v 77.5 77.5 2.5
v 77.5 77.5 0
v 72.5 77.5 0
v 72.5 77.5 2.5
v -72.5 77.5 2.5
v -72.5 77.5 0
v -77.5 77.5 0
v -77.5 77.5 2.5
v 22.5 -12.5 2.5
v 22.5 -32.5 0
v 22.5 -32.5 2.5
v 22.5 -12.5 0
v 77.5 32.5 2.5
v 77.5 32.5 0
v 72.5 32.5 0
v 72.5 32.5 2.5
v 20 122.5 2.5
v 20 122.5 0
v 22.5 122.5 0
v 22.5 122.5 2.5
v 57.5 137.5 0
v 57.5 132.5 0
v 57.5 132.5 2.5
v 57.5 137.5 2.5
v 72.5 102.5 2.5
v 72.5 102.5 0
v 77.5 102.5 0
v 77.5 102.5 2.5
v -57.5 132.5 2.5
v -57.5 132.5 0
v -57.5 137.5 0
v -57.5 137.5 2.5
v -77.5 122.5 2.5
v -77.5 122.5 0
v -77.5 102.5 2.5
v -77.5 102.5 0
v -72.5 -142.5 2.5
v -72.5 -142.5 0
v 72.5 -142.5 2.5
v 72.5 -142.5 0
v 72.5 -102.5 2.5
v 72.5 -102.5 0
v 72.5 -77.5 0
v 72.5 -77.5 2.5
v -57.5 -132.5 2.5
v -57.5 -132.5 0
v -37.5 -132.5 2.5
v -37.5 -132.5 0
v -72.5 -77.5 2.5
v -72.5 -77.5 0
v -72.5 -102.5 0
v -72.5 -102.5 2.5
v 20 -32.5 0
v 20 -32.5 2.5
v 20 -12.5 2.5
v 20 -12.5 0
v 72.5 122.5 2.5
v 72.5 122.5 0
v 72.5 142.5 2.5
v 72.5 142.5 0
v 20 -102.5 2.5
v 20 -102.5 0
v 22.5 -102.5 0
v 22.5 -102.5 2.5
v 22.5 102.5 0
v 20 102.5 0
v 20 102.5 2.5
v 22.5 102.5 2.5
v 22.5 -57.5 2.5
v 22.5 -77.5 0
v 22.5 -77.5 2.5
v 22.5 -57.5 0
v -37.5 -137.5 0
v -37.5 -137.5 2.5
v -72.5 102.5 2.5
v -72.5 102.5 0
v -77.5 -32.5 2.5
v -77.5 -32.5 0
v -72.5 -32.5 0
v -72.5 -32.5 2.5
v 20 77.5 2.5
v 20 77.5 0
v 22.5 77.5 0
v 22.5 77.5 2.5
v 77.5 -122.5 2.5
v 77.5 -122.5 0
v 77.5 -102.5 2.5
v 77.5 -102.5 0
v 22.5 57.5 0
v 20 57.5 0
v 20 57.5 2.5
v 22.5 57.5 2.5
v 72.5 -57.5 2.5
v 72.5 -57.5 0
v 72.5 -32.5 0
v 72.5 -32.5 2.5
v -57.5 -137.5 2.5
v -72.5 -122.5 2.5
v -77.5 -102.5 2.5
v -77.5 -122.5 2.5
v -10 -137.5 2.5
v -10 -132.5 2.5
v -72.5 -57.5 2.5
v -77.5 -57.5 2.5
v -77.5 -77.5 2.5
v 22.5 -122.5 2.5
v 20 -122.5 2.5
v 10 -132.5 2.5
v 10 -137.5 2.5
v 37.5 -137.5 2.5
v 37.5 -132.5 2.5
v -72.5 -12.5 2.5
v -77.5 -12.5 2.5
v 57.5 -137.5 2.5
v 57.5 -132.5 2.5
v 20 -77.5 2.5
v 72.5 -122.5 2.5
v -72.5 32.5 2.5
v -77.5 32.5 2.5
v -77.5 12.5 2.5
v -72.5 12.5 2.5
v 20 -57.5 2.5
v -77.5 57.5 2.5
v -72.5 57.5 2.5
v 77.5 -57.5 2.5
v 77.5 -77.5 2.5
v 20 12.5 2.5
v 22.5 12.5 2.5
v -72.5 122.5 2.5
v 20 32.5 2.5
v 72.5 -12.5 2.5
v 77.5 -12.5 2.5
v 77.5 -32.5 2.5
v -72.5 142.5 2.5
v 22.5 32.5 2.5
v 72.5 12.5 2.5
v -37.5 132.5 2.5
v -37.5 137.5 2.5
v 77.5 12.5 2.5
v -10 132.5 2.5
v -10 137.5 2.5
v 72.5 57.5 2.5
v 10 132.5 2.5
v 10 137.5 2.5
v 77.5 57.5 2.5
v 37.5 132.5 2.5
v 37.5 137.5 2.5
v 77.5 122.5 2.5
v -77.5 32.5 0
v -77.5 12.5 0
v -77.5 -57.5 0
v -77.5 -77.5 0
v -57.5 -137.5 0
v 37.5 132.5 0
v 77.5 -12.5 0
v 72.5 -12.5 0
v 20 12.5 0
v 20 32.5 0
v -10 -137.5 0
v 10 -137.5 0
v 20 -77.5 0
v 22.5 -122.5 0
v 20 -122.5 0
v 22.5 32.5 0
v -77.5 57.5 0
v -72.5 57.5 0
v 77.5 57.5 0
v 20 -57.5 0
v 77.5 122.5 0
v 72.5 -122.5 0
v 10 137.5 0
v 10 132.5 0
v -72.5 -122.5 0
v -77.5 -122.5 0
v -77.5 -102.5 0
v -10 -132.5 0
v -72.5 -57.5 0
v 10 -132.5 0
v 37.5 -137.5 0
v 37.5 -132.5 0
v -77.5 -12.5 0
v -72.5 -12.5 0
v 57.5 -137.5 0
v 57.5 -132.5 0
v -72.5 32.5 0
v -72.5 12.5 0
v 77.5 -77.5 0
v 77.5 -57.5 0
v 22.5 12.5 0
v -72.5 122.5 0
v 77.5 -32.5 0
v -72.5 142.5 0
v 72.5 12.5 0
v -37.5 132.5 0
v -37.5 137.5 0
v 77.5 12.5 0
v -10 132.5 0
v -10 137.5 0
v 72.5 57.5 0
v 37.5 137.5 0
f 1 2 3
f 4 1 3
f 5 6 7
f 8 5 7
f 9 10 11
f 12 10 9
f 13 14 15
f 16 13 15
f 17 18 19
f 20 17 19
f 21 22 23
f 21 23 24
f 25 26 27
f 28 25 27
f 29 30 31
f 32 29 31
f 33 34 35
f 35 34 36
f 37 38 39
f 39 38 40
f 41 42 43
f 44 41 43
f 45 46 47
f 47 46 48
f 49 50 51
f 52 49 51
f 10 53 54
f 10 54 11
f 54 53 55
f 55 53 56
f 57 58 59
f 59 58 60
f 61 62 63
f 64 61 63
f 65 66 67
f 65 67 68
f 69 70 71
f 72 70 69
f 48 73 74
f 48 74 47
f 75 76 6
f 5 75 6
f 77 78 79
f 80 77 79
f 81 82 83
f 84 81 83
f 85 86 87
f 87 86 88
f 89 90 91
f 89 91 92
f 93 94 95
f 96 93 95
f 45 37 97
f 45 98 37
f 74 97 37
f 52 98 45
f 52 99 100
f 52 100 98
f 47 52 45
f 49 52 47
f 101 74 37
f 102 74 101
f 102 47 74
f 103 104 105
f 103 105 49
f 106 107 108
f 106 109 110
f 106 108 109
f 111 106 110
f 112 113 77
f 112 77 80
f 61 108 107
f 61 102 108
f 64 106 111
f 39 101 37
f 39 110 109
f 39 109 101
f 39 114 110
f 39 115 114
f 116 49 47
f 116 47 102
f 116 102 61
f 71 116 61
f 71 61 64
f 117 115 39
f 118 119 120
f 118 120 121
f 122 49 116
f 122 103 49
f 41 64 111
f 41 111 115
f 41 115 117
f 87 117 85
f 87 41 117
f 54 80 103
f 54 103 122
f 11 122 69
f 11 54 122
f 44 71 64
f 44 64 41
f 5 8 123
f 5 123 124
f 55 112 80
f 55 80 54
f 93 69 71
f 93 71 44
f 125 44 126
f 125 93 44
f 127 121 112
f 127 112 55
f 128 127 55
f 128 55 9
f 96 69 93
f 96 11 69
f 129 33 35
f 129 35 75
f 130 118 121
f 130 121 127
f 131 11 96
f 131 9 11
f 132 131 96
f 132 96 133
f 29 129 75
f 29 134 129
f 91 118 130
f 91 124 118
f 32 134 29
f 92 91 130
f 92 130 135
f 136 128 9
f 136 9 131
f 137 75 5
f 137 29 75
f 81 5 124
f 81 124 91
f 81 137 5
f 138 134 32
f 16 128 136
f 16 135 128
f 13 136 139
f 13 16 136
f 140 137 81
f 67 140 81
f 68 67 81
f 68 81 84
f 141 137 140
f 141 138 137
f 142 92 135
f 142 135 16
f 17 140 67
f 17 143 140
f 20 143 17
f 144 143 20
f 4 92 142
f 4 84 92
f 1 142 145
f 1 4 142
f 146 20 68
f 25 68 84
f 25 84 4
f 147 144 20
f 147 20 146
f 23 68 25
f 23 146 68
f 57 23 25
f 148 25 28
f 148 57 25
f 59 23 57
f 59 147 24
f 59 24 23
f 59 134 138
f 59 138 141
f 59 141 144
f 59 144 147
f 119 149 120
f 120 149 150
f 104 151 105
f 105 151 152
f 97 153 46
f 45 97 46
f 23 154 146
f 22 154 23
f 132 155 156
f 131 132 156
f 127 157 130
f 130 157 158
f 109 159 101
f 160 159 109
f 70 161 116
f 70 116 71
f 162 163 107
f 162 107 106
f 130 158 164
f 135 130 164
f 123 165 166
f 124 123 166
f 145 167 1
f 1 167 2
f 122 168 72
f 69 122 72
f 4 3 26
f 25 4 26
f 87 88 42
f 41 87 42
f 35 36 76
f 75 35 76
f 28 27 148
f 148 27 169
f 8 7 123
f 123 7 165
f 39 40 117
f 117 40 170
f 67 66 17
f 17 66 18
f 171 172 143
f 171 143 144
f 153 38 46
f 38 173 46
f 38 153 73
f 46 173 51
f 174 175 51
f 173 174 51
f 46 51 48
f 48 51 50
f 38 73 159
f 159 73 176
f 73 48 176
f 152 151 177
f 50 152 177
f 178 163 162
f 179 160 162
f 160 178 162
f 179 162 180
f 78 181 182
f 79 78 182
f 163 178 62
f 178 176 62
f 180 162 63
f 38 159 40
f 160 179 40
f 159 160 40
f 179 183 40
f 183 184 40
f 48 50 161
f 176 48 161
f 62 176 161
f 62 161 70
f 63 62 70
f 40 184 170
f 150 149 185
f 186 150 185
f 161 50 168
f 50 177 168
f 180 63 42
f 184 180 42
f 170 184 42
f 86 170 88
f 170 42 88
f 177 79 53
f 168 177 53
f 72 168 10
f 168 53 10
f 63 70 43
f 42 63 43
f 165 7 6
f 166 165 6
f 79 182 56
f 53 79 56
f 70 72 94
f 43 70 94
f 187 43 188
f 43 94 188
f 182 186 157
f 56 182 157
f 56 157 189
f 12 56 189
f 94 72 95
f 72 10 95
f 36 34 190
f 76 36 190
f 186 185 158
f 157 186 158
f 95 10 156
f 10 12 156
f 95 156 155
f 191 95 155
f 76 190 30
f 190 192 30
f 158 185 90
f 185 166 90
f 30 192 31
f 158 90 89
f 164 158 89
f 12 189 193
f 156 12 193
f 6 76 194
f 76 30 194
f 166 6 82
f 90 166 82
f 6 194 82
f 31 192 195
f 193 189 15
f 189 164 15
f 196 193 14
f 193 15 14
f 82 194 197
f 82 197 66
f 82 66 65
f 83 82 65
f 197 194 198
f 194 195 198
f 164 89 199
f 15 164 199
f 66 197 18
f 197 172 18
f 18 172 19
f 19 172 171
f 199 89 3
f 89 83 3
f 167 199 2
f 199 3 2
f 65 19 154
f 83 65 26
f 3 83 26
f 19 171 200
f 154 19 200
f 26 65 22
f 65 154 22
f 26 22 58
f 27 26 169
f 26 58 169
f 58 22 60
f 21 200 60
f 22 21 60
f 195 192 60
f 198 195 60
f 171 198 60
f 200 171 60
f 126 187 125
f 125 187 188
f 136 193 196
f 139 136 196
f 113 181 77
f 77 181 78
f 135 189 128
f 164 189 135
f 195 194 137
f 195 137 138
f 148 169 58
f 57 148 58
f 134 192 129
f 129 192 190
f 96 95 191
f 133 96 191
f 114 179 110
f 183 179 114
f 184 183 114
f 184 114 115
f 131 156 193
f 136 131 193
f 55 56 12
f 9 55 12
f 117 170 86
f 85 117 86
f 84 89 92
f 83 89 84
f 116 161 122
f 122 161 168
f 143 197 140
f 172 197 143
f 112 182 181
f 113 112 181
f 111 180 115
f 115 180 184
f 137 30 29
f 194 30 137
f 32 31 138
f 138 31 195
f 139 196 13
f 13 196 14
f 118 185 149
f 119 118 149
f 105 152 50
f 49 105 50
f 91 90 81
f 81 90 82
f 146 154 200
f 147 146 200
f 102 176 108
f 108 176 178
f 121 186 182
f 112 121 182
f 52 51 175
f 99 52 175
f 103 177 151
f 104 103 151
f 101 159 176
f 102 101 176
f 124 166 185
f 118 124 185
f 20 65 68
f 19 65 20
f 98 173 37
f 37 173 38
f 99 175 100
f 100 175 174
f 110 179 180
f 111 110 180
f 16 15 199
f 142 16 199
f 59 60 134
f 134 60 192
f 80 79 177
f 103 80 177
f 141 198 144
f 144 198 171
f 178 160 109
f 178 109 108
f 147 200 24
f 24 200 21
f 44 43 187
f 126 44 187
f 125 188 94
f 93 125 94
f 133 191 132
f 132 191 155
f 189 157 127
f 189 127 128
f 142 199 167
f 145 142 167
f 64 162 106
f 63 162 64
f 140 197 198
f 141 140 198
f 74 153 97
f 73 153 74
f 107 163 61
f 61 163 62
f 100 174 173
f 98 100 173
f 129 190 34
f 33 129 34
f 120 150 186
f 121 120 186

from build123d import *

# Parameters (mm, degrees)
SKETCH1_W           = 20
SKETCH1_H           = 5
SKETCH1_W_2         = 2.5
SKETCH1_H_2         = 20
BOSS_EXTRUDE1_DEPTH = 2.5


with BuildPart() as part:
    # Sketch1 → Boss-Extrude1 (new body)
    with BuildSketch(Plane.XY):
        Polygon((-72.5, 122.5), (-77.5, 122.5), (-77.5, 102.5), (-72.5, 102.5), (-72.5, 77.5), (-77.5, 77.5), (-77.5, 57.5), (-72.5, 57.5), (-72.5, 32.5), (-77.5, 32.5), (-77.5, 12.5), (-72.5, 12.5), (-72.5, -12.5), (-77.5, -12.5), (-77.5, -32.5), (-72.5, -32.5), (-72.5, -57.5), (-77.5, -57.5), (-77.5, -77.5), (-72.5, -77.5), (-72.5, -102.5), (-77.5, -102.5), (-77.5, -122.5), (-72.5, -122.5), (-72.5, -142.5), (72.5, -142.5), (72.5, -122.5), (77.5, -122.5), (77.5, -102.5), (72.5, -102.5), (72.5, -77.5), (77.5, -77.5), (77.5, -57.5), (72.5, -57.5), (72.5, -32.5), (77.5, -32.5), (77.5, -12.5), (72.5, -12.5), (72.5, 12.5), (77.5, 12.5), (77.5, 32.5), (72.5, 32.5), (72.5, 57.5), (77.5, 57.5), (77.5, 77.5), (72.5, 77.5), (72.5, 102.5), (77.5, 102.5), (77.5, 122.5), (72.5, 122.5), (72.5, 142.5), (-72.5, 142.5), align=None)
        with Locations((-47.5, 135)):
            Rectangle(SKETCH1_W, SKETCH1_H, mode=Mode.SUBTRACT)
        with Locations((-47.5, -135)):
            Rectangle(SKETCH1_W, SKETCH1_H, mode=Mode.SUBTRACT)
        with Locations((0, 135)):
            Rectangle(SKETCH1_W, SKETCH1_H, mode=Mode.SUBTRACT)
        with Locations((0, -135)):
            Rectangle(SKETCH1_W, SKETCH1_H, mode=Mode.SUBTRACT)
        with Locations((47.5, 135)):
            Rectangle(SKETCH1_W, SKETCH1_H, mode=Mode.SUBTRACT)
        with Locations((47.5, -135)):
            Rectangle(SKETCH1_W, SKETCH1_H, mode=Mode.SUBTRACT)
        with Locations((21.25, 67.5)):
            Rectangle(SKETCH1_W_2, SKETCH1_H_2, mode=Mode.SUBTRACT)
        with Locations((21.25, 112.5)):
            Rectangle(SKETCH1_W_2, SKETCH1_H_2, mode=Mode.SUBTRACT)
        with Locations((21.25, 22.5)):
            Rectangle(SKETCH1_W_2, SKETCH1_H_2, mode=Mode.SUBTRACT)
        with Locations((21.25, -22.5)):
            Rectangle(SKETCH1_W_2, SKETCH1_H_2, mode=Mode.SUBTRACT)
        with Locations((21.25, -67.5)):
            Rectangle(SKETCH1_W_2, SKETCH1_H_2, mode=Mode.SUBTRACT)
        with Locations((21.25, -112.5)):
            Rectangle(SKETCH1_W_2, SKETCH1_H_2, mode=Mode.SUBTRACT)
    extrude(amount=BOSS_EXTRUDE1_DEPTH)


solid = part.part
